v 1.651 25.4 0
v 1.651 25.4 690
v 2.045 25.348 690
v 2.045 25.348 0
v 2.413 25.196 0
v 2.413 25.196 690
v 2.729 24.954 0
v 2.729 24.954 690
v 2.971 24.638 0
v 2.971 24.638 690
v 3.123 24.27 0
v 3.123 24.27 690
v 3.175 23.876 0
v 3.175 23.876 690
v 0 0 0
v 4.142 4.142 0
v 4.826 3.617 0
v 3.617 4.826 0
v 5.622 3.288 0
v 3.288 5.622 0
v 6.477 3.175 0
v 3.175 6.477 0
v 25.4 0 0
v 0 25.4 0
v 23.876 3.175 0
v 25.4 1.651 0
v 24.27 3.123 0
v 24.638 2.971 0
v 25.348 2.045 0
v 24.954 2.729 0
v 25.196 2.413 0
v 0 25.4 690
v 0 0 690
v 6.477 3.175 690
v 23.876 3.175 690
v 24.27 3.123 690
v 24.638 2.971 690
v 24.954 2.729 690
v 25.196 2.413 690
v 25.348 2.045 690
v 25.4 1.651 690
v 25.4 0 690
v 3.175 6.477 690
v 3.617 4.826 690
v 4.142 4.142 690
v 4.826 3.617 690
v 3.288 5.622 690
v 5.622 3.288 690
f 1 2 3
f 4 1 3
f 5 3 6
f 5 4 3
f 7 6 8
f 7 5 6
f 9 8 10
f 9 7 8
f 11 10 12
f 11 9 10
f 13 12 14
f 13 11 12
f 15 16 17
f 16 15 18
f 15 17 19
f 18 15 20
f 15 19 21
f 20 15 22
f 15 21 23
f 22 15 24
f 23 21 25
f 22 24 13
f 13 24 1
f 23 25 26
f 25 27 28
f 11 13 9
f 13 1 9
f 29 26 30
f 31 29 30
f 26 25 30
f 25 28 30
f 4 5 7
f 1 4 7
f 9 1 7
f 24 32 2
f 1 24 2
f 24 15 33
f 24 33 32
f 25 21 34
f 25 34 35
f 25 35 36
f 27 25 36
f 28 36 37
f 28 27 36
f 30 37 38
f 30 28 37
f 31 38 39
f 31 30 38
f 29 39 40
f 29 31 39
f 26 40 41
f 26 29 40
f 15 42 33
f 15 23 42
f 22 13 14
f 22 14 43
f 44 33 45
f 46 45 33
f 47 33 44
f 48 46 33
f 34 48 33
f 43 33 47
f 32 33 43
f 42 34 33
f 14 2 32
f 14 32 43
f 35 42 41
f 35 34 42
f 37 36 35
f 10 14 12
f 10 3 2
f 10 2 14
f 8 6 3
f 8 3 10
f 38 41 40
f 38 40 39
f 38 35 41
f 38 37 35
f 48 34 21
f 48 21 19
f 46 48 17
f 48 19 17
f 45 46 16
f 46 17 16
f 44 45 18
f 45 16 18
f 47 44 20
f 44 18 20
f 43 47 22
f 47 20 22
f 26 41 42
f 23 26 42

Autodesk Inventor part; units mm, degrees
ref_plane "YZ Plane" through (0, 0, 0) normal (1, 0, 0) x (0, 1, 0)
ref_plane "Start Plane" through (0, 0, 0) normal (0, 0, 1) x (1, 0, 0)
ref_plane "End Plane" through (0, 0, 690) normal (0, 0, 1) x (1, 0, 0)
sketch "Sketch" plane through (0, 0, 0) normal (0, 0, 1) x (1, 0, 0)
  line L0 (25.4, 0) -> (0, 0)
  line L1 (0, 0) -> (0, 25.4)
  line L2 (0, 25.4) -> (1.651, 25.4)
  line L3 (3.175, 23.876) -> (3.175, 6.477)
  line L4 (6.477, 3.175) -> (23.876, 3.175)
  line L5 (25.4, 1.651) -> (25.4, 0)
  line L6 (0, -11.0414) -> (0, 31.5385) construction
  line L7 (-11.0414, 0) -> (31.5385, 0) construction
  arc A0 (3.175, 6.477) -> (6.477, 3.175) centre (6.477, 6.477) ccw
  arc A1 (3.175, 23.876) -> (1.651, 25.4) centre (1.651, 23.876) ccw
  arc A2 (25.4, 1.651) -> (23.876, 3.175) centre (23.876, 1.651) ccw
  line L8 (0, 40.0545) -> (0, -19.5574) construction
  line L9 (-19.5574, 0) -> (40.0545, 0) construction
  point P0 (3.175, 25.4)
  point P1 (3.175, 3.175)
  point P2 (25.4, 3.175)
  dimension "d0" = 25.4
  dimension "d1" = 25.4
  dimension "d2" = 3.175
  dimension "d3" = 3.175
  dimension "d10" = 0
  dimension "d11" = 0
  dimension "d14" = 3.302
  dimension "d15" = 1.524
extrude "Body" add sketch "Sketch" along normal up to surface (690 mm away) from surface at 0
sketch "Sketch3" plane through (0, 0, 0) normal (0, 0, 1) x (1, 0, 0)
  line L0 (0, 0) -> (10, 0)
ref_plane "Work Plane3" through (0, 0, 0) normal (0, -1, 0) x (1, 0, 0)
sketch "Sketch4" plane through (0, 0, 0) normal (0, -1, 0) x (1, 0, 0)
  line L0 (-2, 0) -> (12, 0) projected
  line L1 (-2, 690) -> (12, 690) projected
  dimension "d17" = 690
equation "\"d0\" = G_H"
equation "\"d1\" = G_H"
equation "\"d2\" = G_T"
equation "\"d3\" = G_T"
equation "\"d14\" = G_IR"
equation "\"d15\" = G_ER"
equation "\"d4\" = G_L"
equation "\"G_H\" = 25.4"
equation "\"G_T\" = 3.175"
equation "\"G_ER\" = 1.524"
equation "\"G_IR\" = 3.302"
equation "\"G_L\" = d17"
equation "\"ex\" = 0"
equation "\"G_OFFSET_START\" = 0"
equation "\"G_OFFSET_END\" = 0"
equation "\"d13\" = G_OFFSET_END + B_L"
equation "\"B_L\" = 690"
properties part number "AISC - L 1 x 1 x 1/8 - 27.165" material "Steel, Mild"
